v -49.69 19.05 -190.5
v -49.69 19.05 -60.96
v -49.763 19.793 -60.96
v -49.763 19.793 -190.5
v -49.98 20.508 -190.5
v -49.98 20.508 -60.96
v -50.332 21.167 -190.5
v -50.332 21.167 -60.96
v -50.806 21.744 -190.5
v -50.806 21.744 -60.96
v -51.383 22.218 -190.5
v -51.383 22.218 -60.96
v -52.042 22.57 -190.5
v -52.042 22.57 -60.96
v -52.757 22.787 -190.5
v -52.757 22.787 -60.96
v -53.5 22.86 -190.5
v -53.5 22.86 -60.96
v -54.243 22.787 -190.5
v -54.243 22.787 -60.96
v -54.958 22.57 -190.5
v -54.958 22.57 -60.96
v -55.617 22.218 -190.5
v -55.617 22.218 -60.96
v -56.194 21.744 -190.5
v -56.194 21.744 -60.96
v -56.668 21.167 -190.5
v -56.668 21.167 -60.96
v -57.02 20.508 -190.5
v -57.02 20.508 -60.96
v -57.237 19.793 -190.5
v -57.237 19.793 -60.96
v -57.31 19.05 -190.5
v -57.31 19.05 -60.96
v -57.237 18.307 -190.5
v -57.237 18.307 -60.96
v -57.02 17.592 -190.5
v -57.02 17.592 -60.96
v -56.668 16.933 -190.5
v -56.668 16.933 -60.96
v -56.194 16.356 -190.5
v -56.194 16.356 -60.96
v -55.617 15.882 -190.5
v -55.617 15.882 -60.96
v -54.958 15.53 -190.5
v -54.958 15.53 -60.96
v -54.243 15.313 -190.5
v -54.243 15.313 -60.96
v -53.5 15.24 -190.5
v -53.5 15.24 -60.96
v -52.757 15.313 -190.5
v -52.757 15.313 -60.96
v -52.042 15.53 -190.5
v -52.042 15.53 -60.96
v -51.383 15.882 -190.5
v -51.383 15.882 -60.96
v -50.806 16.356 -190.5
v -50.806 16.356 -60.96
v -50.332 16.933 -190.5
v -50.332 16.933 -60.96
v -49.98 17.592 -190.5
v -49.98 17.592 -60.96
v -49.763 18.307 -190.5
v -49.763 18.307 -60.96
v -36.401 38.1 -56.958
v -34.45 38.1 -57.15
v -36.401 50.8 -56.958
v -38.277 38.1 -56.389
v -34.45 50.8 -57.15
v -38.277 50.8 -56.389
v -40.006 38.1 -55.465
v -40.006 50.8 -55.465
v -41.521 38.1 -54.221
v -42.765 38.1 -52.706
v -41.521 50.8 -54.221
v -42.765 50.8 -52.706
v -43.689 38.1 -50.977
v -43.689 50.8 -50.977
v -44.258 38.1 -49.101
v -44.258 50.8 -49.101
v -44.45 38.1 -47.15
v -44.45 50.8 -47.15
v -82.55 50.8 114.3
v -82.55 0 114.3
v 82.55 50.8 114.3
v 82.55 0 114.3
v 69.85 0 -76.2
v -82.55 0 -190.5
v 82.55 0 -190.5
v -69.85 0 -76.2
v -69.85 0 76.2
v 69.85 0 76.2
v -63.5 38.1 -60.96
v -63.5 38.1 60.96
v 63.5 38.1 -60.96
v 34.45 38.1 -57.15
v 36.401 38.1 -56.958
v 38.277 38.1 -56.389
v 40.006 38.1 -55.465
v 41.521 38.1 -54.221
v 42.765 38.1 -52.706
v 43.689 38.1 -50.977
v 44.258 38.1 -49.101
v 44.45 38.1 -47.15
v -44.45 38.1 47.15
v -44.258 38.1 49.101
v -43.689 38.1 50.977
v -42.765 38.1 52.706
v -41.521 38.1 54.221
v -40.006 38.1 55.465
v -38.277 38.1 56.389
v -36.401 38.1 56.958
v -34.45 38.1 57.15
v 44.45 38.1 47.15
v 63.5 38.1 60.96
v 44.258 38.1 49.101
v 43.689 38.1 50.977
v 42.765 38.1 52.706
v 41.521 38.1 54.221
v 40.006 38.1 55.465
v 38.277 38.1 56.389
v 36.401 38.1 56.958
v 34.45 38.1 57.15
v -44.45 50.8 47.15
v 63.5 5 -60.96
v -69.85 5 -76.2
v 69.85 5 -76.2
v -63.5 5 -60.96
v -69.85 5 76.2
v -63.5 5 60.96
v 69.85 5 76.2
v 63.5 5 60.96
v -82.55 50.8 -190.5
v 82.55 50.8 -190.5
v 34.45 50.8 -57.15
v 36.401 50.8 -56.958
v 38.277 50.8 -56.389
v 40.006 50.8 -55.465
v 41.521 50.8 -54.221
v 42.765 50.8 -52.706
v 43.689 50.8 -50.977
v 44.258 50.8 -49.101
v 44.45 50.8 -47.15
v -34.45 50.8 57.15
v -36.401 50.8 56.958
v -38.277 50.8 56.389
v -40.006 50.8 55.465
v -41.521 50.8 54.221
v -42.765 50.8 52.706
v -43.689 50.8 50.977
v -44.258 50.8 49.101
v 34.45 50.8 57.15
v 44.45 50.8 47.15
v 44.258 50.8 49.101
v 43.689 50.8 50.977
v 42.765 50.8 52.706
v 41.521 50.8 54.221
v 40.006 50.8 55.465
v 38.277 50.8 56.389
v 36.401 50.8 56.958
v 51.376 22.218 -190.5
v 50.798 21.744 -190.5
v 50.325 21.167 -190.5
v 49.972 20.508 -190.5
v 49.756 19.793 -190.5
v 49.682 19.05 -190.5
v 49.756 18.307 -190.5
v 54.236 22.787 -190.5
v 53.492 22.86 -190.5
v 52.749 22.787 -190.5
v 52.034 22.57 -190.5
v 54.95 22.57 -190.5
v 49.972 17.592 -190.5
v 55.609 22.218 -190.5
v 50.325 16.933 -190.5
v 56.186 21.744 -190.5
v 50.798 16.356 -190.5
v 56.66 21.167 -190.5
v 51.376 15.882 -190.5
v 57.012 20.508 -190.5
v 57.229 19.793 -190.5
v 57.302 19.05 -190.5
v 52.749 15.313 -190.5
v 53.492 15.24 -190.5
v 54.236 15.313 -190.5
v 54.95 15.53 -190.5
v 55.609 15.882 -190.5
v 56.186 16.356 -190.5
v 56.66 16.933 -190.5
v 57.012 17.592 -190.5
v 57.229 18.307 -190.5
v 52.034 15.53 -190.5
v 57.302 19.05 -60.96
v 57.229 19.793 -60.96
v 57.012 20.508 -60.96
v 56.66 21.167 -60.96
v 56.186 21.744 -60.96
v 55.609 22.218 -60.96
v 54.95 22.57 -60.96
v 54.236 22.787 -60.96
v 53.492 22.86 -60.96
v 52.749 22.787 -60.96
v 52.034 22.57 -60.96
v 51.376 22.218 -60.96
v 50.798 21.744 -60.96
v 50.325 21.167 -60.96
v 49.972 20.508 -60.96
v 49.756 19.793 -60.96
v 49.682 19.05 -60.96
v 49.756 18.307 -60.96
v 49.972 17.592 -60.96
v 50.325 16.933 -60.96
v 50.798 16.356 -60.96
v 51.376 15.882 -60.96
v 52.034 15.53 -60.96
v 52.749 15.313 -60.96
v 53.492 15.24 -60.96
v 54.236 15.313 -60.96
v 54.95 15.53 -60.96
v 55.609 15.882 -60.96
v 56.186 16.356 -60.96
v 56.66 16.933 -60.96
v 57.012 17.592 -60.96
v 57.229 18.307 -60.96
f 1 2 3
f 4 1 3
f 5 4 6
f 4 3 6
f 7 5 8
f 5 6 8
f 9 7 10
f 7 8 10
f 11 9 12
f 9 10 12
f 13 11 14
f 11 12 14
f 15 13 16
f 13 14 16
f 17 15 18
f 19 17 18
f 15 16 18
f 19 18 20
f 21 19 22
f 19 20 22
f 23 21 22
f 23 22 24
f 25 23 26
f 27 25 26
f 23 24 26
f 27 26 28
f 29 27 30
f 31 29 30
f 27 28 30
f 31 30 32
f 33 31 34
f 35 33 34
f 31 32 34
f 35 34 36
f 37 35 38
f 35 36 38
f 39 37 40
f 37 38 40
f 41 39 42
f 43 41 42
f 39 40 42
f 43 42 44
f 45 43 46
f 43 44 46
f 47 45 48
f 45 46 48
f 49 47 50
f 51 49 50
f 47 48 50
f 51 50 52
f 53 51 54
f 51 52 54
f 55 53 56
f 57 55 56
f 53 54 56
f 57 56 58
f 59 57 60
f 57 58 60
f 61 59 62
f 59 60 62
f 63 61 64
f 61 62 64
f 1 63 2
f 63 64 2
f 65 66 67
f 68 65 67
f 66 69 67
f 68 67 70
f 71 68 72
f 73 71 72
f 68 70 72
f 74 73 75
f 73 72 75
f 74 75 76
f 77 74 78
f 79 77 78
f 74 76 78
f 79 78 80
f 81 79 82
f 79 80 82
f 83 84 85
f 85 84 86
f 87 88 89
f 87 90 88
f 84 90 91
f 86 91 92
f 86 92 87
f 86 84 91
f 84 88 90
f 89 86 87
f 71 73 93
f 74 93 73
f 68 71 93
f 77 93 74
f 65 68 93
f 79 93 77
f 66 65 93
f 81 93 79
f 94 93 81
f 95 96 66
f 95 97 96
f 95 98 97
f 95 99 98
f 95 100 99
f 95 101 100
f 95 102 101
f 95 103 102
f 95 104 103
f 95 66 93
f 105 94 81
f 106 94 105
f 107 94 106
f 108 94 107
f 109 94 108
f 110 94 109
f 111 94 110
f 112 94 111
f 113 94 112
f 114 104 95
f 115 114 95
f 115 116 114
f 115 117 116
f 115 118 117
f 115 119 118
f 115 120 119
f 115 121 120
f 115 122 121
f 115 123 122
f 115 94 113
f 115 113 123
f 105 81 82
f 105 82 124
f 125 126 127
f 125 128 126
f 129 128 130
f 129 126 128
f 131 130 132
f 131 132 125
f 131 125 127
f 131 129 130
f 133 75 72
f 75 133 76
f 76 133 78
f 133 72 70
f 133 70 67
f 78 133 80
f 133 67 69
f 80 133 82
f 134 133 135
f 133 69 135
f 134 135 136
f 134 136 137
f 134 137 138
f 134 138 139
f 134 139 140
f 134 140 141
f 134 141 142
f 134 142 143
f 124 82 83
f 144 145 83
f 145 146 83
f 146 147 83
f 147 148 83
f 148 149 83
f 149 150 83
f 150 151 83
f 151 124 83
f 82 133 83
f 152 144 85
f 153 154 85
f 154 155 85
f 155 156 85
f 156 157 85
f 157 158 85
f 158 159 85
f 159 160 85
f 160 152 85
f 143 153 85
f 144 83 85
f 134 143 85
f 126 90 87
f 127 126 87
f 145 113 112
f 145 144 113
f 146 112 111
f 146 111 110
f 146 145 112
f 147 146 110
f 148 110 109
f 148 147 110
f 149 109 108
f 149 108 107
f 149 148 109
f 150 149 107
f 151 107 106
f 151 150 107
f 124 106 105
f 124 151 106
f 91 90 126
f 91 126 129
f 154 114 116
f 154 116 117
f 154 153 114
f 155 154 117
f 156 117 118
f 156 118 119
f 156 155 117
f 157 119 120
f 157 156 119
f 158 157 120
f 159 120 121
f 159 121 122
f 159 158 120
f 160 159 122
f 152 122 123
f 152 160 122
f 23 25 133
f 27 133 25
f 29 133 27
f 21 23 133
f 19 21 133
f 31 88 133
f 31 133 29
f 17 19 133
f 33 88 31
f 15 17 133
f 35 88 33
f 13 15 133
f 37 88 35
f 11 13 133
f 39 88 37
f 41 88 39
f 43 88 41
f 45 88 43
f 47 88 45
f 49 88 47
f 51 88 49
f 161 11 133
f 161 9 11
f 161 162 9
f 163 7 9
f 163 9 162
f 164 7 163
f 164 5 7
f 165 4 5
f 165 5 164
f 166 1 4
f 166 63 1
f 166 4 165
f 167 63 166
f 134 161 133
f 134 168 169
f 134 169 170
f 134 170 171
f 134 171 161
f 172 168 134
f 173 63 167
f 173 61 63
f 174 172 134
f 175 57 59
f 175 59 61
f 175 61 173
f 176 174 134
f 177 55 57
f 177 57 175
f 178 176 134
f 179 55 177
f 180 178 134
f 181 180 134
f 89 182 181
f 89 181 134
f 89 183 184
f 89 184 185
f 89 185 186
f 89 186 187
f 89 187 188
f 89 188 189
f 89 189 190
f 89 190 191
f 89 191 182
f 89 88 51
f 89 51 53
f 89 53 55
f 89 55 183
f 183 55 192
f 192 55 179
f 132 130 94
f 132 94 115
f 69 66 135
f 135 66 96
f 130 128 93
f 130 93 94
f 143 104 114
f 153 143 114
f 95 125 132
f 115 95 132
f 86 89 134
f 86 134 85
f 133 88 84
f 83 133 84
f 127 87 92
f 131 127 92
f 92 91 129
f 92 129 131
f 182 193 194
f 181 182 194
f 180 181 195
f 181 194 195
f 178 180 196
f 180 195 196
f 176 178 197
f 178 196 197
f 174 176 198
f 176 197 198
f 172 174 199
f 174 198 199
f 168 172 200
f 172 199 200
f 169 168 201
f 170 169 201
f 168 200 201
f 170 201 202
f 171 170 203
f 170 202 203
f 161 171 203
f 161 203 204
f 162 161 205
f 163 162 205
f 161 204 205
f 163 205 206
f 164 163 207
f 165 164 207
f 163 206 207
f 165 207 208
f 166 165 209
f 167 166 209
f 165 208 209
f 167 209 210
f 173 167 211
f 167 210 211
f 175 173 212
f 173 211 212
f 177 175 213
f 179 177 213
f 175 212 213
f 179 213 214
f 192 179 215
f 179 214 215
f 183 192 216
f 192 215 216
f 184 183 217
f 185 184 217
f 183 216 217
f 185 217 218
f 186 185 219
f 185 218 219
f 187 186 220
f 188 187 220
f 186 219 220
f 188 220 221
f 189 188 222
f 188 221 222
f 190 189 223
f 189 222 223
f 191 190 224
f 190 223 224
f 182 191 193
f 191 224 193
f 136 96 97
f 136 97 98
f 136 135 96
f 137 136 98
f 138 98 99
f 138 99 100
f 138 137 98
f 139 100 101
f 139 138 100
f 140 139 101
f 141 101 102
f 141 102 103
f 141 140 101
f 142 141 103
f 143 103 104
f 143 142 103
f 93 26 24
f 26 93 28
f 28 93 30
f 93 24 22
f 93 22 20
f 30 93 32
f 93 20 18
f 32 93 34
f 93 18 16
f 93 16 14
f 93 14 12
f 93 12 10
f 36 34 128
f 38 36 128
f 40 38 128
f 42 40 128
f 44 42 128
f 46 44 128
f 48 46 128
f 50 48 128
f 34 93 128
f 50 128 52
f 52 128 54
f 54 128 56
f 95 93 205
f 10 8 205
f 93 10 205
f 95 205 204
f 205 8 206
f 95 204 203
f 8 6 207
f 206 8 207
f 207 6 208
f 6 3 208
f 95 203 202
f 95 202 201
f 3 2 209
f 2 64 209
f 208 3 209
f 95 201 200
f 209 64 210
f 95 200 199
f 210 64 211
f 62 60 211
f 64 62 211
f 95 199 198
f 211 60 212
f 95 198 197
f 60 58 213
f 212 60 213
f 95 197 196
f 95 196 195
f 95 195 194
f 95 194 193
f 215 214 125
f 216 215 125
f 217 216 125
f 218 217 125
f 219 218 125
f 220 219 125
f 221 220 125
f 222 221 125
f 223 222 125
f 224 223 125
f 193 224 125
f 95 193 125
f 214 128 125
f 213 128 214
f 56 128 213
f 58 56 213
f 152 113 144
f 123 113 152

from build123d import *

# Parameters (mm, degrees)
F0_W     = 165.1
F0_H     = 304.8
F0_W_2   = 139.7
F0_H_2   = 152.4
F0_W_3   = 127
F0_H_3   = 121.92
F0_W_4   = 88.9
F0_H_4   = 114.3
F1_DEPTH = 50.8
F2_DEPTH = 5
F3_DEPTH = 38.1
F4_R     = 10
F5_R     = 3.81
F6_DEPTH = 129.54


# Not quite as in the source:
# - a feature names something its author has since deleted; it is built from what else it names


with BuildPart() as f1:
    # F0 (on Front) → F1 (new body)
    with BuildSketch(Plane.XZ):
        with Locations((0, -38.1)):
            Rectangle(F0_W, F0_H)
        Rectangle(F0_W_2, F0_H_2, mode=Mode.SUBTRACT)
        Rectangle(F0_W_2, F0_H_2)
        Rectangle(F0_W_3, F0_H_3, mode=Mode.SUBTRACT)
        Rectangle(F0_W_3, F0_H_3)
        Rectangle(F0_W_4, F0_H_4, mode=Mode.SUBTRACT)
    extrude(amount=-F1_DEPTH)

    # F0 (on Front) → F2 (cut)
    with BuildSketch(Plane.XZ):
        Rectangle(F0_W_2, F0_H_2)
        Rectangle(F0_W_3, F0_H_3, mode=Mode.SUBTRACT)
    extrude(amount=-F2_DEPTH, mode=Mode.SUBTRACT)

    # F0 (on Front) → F3 (cut)
    with BuildSketch(Plane.XZ):
        Rectangle(F0_W_3, F0_H_3)
        Rectangle(F0_W_4, F0_H_4, mode=Mode.SUBTRACT)
    extrude(amount=-F3_DEPTH, mode=Mode.SUBTRACT)

    # F4
    f4_edges = [f1.edges().sort_by_distance(p)[0] for p in [
        (-44.45, 44.45, 57.15),
        (44.45, 44.45, 57.15),
        (-44.45, 44.45, -57.15),
        (44.45, 44.45, -57.15),
    ]]
    fillet(f4_edges, radius=F4_R)

    # F5 (on face) → F6 (cut, through all)
    with BuildSketch(Plane.XY.offset(-60.96)):
        with Locations((-53.5, 19.05)):
            Circle(F5_R)
        with Locations((53.4924, 19.05)):
            Circle(F5_R)
    extrude(amount=-F6_DEPTH, mode=Mode.SUBTRACT)


solid = f1.part
